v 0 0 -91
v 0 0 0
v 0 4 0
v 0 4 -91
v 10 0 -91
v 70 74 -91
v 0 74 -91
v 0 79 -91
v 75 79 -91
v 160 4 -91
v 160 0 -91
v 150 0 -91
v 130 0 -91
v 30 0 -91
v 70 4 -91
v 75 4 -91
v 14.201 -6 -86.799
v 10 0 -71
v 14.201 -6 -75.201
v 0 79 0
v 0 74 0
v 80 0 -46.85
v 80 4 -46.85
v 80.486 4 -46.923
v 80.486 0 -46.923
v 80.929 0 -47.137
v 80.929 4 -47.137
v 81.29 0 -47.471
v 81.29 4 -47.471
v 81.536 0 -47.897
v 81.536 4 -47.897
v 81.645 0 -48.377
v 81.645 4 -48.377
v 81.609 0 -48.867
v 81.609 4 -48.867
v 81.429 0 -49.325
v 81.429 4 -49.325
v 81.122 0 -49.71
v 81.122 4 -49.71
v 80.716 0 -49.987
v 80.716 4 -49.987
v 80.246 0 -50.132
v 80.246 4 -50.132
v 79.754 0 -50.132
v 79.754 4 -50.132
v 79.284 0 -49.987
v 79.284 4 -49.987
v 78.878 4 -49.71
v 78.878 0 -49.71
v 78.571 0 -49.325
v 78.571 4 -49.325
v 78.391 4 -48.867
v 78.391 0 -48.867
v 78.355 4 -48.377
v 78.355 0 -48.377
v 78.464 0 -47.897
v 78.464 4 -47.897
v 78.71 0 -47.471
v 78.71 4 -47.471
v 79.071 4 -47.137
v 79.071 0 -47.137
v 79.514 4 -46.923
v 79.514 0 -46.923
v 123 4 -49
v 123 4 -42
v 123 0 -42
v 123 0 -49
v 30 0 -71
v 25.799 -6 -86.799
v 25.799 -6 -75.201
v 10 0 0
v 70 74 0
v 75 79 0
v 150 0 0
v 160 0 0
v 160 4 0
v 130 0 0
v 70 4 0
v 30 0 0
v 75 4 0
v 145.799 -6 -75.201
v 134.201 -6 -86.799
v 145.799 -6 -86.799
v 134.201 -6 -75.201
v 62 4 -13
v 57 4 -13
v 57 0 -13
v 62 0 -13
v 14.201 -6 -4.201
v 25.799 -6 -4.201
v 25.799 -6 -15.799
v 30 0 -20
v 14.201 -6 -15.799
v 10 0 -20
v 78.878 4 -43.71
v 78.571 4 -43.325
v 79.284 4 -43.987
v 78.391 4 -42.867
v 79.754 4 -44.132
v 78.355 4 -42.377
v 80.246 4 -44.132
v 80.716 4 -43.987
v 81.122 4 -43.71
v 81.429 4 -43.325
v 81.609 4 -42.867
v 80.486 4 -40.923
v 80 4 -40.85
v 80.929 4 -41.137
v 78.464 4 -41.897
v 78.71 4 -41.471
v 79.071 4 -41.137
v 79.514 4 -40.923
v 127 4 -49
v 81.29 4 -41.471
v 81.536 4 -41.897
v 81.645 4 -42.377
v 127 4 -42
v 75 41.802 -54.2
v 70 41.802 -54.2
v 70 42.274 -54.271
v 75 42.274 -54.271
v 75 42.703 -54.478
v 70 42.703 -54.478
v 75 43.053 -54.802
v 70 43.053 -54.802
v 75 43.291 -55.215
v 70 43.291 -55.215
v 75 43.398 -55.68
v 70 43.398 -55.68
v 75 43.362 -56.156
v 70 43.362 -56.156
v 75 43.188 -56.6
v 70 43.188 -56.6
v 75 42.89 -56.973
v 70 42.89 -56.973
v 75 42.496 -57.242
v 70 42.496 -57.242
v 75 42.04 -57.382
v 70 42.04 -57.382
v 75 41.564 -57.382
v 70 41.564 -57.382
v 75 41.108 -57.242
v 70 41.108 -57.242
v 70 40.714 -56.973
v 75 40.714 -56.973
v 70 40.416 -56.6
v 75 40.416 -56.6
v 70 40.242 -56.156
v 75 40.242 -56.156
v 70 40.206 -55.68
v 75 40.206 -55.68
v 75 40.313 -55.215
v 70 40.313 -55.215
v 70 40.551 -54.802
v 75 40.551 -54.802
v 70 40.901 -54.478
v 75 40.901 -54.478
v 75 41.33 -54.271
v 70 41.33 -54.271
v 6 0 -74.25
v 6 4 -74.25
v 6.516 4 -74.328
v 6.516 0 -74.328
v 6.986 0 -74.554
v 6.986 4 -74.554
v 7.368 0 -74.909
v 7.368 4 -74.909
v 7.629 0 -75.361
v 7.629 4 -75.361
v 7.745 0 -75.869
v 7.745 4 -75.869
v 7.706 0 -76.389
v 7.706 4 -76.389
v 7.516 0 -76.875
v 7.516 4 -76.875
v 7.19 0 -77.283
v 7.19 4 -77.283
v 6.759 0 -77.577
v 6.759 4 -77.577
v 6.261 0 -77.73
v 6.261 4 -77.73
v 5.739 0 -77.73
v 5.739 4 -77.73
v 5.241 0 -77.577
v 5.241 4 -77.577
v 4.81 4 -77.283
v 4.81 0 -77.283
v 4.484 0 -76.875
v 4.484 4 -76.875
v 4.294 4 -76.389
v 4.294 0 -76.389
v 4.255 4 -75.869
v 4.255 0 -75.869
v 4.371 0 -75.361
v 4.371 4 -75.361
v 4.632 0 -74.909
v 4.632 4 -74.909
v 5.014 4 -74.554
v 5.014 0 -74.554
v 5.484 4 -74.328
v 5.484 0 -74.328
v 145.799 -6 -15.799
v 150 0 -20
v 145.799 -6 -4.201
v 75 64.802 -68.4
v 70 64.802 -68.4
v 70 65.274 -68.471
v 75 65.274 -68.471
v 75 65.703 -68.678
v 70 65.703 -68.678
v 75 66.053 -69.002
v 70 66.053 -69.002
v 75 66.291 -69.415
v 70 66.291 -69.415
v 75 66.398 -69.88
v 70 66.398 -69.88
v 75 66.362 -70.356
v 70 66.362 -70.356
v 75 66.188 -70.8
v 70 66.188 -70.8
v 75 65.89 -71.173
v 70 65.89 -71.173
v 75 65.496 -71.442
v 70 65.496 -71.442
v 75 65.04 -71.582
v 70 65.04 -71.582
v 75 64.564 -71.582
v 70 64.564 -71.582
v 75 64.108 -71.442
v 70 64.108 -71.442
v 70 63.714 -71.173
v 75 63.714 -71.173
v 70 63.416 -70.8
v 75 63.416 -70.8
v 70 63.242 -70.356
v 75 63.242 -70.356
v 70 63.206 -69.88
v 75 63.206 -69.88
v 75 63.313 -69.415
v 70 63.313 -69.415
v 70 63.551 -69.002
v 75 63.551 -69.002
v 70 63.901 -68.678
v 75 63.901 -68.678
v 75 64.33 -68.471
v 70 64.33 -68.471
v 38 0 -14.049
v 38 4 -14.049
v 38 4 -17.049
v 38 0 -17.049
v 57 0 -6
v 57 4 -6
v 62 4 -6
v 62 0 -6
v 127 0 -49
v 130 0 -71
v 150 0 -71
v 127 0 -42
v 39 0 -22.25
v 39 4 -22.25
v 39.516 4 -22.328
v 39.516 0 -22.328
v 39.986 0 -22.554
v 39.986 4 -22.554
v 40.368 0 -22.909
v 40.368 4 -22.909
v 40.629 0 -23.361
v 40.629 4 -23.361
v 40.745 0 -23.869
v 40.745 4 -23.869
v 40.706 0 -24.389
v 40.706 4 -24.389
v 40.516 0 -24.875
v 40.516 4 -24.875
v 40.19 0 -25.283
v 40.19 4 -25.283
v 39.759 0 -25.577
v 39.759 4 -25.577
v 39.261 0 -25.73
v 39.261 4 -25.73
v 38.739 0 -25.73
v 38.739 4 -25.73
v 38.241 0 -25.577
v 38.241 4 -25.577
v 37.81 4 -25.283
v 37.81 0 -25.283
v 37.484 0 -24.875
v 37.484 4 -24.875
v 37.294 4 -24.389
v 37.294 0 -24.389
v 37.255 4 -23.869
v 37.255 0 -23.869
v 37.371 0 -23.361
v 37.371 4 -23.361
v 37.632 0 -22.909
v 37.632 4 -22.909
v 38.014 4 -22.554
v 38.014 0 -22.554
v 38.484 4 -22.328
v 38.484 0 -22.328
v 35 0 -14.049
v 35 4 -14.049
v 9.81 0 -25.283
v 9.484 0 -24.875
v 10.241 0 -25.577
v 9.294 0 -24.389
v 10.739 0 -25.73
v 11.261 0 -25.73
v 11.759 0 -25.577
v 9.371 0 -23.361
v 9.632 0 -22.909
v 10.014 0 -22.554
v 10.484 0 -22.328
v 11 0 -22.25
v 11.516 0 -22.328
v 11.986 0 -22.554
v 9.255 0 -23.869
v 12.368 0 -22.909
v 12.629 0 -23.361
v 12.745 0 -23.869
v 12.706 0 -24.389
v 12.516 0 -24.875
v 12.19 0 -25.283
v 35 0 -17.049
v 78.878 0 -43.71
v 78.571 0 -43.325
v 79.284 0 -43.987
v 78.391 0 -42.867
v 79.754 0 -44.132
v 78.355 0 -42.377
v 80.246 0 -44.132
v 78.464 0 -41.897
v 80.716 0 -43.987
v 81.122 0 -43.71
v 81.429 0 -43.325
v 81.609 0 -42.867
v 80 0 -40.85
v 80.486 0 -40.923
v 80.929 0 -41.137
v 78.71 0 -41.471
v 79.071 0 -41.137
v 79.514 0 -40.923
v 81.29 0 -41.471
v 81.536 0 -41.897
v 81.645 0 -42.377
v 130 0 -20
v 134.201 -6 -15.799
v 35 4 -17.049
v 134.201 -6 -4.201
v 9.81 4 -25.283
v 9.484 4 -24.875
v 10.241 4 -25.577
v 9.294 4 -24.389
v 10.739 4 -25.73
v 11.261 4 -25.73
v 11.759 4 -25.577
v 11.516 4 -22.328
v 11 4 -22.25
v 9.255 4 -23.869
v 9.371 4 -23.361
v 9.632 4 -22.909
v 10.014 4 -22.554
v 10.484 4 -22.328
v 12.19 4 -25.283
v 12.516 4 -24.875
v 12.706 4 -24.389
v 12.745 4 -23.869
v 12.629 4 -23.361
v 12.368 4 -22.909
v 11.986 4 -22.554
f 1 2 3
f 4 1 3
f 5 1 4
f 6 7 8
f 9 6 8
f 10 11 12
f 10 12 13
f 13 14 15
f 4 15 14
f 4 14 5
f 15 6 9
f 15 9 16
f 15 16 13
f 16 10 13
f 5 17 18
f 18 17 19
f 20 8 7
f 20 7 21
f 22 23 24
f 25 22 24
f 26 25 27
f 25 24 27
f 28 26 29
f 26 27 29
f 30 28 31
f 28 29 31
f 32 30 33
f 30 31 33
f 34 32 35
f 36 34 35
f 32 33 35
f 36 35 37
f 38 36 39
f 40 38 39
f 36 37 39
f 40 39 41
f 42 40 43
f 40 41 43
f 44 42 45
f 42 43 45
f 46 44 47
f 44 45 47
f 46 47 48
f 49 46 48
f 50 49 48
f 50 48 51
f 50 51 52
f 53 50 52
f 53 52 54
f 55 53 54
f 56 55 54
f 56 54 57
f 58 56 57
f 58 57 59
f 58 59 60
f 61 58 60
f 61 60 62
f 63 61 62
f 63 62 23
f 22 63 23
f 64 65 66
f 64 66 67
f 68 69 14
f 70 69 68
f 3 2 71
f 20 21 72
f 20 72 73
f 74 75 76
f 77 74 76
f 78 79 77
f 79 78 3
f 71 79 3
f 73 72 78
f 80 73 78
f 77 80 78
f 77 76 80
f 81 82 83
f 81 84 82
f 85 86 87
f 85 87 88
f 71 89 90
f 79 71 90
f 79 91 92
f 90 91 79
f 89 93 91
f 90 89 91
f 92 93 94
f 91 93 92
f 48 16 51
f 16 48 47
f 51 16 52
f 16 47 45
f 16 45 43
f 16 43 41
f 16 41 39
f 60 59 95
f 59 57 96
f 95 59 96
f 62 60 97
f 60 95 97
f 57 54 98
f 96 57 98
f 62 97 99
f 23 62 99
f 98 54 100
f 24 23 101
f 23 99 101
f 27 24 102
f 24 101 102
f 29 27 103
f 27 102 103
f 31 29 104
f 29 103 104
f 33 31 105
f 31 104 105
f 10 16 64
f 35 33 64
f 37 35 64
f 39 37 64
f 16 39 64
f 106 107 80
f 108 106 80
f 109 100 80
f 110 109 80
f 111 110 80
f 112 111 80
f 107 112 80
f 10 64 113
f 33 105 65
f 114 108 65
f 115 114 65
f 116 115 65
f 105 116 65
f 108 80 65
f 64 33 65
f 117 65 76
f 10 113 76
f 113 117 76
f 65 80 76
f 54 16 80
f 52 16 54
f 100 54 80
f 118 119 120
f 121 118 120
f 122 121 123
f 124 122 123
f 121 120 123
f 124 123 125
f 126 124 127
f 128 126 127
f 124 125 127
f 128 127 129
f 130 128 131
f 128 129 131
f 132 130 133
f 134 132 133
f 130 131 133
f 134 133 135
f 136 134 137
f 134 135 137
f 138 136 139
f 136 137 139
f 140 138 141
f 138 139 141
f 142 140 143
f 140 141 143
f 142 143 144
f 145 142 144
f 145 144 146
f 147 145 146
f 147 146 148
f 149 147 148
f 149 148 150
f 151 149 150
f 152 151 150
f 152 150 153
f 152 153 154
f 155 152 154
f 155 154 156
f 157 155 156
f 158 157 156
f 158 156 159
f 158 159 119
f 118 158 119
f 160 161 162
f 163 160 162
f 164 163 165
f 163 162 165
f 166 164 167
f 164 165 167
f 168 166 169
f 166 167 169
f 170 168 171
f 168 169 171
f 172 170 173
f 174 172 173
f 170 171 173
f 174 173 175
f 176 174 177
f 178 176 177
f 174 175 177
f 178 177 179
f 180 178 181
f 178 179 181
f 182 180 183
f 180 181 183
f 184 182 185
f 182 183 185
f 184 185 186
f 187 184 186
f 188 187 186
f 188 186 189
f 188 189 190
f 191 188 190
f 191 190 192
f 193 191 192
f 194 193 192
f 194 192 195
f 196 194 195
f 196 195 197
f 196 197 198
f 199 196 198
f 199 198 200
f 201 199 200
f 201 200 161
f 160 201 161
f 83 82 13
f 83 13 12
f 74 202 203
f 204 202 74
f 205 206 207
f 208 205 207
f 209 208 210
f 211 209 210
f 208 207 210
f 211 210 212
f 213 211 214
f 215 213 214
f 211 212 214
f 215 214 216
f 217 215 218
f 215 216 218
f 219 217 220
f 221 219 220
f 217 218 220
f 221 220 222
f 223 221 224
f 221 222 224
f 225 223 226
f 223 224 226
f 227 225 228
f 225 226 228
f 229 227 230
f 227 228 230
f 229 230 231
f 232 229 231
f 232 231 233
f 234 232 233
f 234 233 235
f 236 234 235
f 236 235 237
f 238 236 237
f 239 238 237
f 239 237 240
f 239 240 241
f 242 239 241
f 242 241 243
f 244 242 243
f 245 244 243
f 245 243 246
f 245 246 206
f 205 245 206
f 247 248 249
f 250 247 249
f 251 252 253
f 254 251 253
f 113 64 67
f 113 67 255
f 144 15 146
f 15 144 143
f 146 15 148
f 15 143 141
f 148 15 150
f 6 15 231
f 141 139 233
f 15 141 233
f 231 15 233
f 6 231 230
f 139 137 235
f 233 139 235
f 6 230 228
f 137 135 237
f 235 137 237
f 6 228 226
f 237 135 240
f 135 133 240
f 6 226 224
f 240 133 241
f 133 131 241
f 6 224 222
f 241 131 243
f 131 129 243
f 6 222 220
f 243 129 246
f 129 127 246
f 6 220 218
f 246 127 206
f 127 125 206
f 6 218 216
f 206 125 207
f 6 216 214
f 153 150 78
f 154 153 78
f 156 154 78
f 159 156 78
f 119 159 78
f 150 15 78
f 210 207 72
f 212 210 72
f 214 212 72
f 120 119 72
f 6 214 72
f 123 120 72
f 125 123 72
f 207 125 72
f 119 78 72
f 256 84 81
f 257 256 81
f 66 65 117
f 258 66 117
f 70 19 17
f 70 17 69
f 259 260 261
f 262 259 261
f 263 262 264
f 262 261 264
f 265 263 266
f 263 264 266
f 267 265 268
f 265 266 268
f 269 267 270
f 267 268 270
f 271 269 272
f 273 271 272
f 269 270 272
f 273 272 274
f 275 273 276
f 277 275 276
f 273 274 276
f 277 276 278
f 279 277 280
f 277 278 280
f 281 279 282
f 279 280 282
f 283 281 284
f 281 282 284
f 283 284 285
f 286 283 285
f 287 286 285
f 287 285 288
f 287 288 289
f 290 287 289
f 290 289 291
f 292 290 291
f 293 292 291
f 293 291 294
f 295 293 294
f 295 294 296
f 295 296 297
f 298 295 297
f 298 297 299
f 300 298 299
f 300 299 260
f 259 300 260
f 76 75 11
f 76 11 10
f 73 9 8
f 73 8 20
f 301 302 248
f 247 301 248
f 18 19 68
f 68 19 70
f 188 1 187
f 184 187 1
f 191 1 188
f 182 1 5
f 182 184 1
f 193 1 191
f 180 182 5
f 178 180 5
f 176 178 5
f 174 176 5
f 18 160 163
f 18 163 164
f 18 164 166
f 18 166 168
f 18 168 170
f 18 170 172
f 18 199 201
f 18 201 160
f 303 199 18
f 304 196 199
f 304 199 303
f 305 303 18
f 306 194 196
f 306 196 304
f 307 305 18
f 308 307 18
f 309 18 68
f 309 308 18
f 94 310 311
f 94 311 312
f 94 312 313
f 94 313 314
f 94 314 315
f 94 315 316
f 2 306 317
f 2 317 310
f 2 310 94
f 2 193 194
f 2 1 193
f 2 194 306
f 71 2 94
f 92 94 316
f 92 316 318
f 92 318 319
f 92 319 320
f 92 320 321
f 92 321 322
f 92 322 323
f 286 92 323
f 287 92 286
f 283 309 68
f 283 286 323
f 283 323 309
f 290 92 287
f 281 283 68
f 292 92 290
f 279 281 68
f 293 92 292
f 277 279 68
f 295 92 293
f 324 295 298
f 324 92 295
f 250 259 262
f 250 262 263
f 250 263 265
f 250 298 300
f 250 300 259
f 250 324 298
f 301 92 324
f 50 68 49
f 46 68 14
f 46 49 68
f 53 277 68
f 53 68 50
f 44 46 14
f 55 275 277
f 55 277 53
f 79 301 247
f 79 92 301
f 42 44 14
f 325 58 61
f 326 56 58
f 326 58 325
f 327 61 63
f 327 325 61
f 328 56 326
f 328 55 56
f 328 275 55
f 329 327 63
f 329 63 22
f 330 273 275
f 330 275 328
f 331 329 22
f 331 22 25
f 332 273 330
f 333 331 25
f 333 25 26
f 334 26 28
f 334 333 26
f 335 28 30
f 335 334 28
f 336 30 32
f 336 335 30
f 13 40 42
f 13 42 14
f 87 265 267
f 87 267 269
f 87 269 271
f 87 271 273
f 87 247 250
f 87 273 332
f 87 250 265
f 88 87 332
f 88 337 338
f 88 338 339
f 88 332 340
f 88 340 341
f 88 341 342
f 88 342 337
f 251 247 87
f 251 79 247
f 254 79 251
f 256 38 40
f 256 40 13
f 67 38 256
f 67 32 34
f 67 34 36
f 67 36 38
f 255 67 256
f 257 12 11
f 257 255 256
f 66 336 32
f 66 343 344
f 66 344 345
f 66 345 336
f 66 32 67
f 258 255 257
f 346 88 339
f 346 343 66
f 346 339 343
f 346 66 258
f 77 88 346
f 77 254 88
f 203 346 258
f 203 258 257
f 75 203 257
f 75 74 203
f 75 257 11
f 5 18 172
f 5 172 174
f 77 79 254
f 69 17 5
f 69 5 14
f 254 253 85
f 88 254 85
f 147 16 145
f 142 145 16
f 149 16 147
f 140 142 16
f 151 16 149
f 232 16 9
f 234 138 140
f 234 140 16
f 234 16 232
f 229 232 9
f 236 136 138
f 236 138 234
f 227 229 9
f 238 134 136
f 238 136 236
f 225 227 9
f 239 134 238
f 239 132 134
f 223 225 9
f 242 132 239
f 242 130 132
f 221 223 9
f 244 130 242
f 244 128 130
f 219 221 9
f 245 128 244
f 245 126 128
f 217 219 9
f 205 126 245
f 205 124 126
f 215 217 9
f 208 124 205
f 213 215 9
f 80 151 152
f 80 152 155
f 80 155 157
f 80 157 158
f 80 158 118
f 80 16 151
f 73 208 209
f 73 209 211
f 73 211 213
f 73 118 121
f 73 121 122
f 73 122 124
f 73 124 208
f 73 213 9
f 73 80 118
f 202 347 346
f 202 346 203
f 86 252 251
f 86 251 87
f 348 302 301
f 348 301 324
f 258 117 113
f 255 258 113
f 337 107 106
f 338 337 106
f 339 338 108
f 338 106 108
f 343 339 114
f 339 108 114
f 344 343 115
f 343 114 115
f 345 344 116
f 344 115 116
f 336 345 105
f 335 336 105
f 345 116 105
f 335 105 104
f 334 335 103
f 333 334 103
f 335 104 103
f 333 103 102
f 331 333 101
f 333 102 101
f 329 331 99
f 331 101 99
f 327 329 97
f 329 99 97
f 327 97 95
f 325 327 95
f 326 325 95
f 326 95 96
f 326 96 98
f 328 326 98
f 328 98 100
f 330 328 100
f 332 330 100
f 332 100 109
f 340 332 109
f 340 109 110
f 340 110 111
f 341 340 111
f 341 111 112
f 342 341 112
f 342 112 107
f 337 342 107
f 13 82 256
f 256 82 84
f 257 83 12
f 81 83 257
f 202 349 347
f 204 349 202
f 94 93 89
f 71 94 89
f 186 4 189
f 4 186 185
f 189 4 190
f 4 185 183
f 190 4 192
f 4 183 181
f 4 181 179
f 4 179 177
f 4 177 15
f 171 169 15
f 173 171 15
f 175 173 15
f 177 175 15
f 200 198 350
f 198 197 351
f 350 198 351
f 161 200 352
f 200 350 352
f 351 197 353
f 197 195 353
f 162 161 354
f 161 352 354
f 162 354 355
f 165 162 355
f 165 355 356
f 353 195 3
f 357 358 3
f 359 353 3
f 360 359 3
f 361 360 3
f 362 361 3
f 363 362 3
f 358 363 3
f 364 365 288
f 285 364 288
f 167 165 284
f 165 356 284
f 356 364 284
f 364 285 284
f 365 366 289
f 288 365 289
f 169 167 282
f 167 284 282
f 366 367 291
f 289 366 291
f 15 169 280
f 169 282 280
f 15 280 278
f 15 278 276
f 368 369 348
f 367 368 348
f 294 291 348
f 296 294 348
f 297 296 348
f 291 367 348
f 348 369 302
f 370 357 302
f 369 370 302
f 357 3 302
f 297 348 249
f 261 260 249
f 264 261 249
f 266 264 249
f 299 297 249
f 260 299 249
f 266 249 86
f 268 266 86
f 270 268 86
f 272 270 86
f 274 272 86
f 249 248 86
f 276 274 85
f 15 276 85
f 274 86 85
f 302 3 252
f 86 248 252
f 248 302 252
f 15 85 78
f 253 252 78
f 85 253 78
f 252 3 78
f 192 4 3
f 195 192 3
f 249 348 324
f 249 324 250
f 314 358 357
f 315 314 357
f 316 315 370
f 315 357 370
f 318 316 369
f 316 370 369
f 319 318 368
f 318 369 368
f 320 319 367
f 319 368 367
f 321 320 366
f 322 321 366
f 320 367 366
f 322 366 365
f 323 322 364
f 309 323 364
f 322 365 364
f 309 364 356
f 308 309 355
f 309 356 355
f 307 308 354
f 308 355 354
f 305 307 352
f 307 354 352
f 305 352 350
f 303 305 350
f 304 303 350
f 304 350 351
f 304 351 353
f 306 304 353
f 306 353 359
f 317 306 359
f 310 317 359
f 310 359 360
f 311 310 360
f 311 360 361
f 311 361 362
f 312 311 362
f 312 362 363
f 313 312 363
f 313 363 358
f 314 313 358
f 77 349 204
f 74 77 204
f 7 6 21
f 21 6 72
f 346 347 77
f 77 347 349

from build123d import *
from OCP.BRepFilletAPI import BRepFilletAPI_MakeChamfer

# Parameters (mm, degrees)
SKETCH1_W           = 160
SKETCH1_H           = 4
BOSS_EXTRUDE1_DEPTH = 91
SKETCH2_W           = 5
SKETCH2_H           = 75
BOSS_EXTRUDE2_DEPTH = 91
SKETCH3_W           = 91
SKETCH3_H           = 5
BOSS_EXTRUDE3_DEPTH = 70
SKETCH4_W           = 5
SKETCH4_H           = 7
CUT_EXTRUDE1_DEPTH  = 91
SKETCH5_R           = 1.75
CUT_EXTRUDE2_DEPTH  = 91
SKETCH6_W           = 3
SKETCH6_H           = 3
CUT_EXTRUDE3_DEPTH  = 91
SKETCH7_R           = 1.65
CUT_EXTRUDE4_DEPTH  = 91
SKETCH8_W           = 20
SKETCH8_H           = 20
BOSS_EXTRUDE4_DEPTH = 6
CHAMFER1_SIZE       = 6
CHAMFER1_SIZE_2     = 4.201245229
SKETCH9_W           = 20
SKETCH9_H           = 20
BOSS_EXTRUDE5_DEPTH = 6
CHAMFER2_SIZE       = 6
CHAMFER2_SIZE_2     = 4.201245229
SKETCH10_W          = 4
SKETCH10_H          = 7
CUT_EXTRUDE5_DEPTH  = 6
SKETCH11_R          = 1.6
CUT_EXTRUDE6_DEPTH  = 6


with BuildPart() as part:
    # Sketch1 → Boss-Extrude1 (new body)
    with BuildSketch(Plane.XY):
        with Locations((80, 2)):
            Rectangle(SKETCH1_W, SKETCH1_H)
    extrude(amount=-BOSS_EXTRUDE1_DEPTH)

    # Sketch2 → Boss-Extrude2 (add)
    with BuildSketch(Plane.XY):
        with Locations((72.5, 41.5)):
            Rectangle(SKETCH2_W, SKETCH2_H)
    extrude(amount=-BOSS_EXTRUDE2_DEPTH)

    # Sketch3 → Boss-Extrude3 (add)
    with BuildSketch(Plane.ZY.offset(-70)):
        with Locations((-45.5, 76.5)):
            Rectangle(SKETCH3_W, SKETCH3_H)
    extrude(amount=BOSS_EXTRUDE3_DEPTH)

    # Sketch4 → Cut-Extrude1 (cut)
    with BuildSketch(Plane(origin=(0, 4, 0), x_dir=(1, 0, 0), z_dir=(0, 1, 0))):
        with Locations((59.5, 9.5)):
            Rectangle(SKETCH4_W, SKETCH4_H)
    extrude(amount=-CUT_EXTRUDE1_DEPTH, mode=Mode.SUBTRACT)

    # Sketch5 → Cut-Extrude2 (cut)
    with BuildSketch(Plane(origin=(0, 4, 0), x_dir=(1, 0, 0), z_dir=(0, 1, 0))):
        with Locations(Location((11, 24, 0), (0, 0, 270))):
            Circle(SKETCH5_R)
        with Locations(Location((39, 24, 0), (0, 0, 270))):
            Circle(SKETCH5_R)
        with Locations(Location((6, 76, 0), (0, 0, 270))):
            Circle(SKETCH5_R)
    extrude(amount=-CUT_EXTRUDE2_DEPTH, mode=Mode.SUBTRACT)

    # Sketch6 → Cut-Extrude3 (cut)
    with BuildSketch(Plane(origin=(0, 4, 0), x_dir=(1, 0, 0), z_dir=(0, 1, 0))):
        with Locations((36.5, 15.548738613)):
            Rectangle(SKETCH6_W, SKETCH6_H)
    extrude(amount=-CUT_EXTRUDE3_DEPTH, mode=Mode.SUBTRACT)

    # Sketch7 → Cut-Extrude4 (cut)
    with BuildSketch(Plane(origin=(0, 4, 0), x_dir=(1, 0, 0), z_dir=(0, 1, 0))):
        with Locations(Location((80, 48.5, 0), (0, 0, 270))):
            Circle(SKETCH7_R)
        with Locations(Location((80, 42.5, 0), (0, 0, 270))):
            Circle(SKETCH7_R)
    extrude(amount=-CUT_EXTRUDE4_DEPTH, mode=Mode.SUBTRACT)

    # Sketch8 → Boss-Extrude4 (add)
    with BuildSketch(Plane.XZ):
        with Locations((20, -10)):
            Rectangle(SKETCH8_W, SKETCH8_H)
    extrude(amount=BOSS_EXTRUDE4_DEPTH)

    # Chamfer1
    chamfer1_edges_1 = [part.edges().sort_by_distance(p)[0] for p in [
        (30, -6, -10),
    ]]
    chamfer1_side_1 = [part.faces().sort_by_distance(p)[0] for p in [
        (30, -5.915975095, -10),
    ]]
    chamfer1_edges_2 = [part.edges().sort_by_distance(p)[0] for p in [
        (20, -6, -20),
    ]]
    chamfer1_side_2 = [part.faces().sort_by_distance(p)[0] for p in [
        (20, -5.915975095, -20),
    ]]
    chamfer1_edges_3 = [part.edges().sort_by_distance(p)[0] for p in [
        (10, -6, -10),
    ]]
    chamfer1_side_3 = [part.faces().sort_by_distance(p)[0] for p in [
        (10, -5.915975095, -10),
    ]]
    chamfer1_edges_4 = [part.edges().sort_by_distance(p)[0] for p in [
        (20, -6, 0),
    ]]
    chamfer1_side_4 = [part.faces().sort_by_distance(p)[0] for p in [
        (20, -5.915975095, 0),
    ]]
    chamfer1 = BRepFilletAPI_MakeChamfer(part.part.solid().wrapped)
    for e in chamfer1_edges_1:
        chamfer1.Add(CHAMFER1_SIZE - 0.0001, CHAMFER1_SIZE_2 - 0.0001, e.wrapped, chamfer1_side_1[0].wrapped)
    for e in chamfer1_edges_2:
        chamfer1.Add(CHAMFER1_SIZE - 0.0001, CHAMFER1_SIZE_2 - 0.0001, e.wrapped, chamfer1_side_2[0].wrapped)
    for e in chamfer1_edges_3:
        chamfer1.Add(CHAMFER1_SIZE - 0.0001, CHAMFER1_SIZE_2 - 0.0001, e.wrapped, chamfer1_side_3[0].wrapped)
    for e in chamfer1_edges_4:
        chamfer1.Add(CHAMFER1_SIZE - 0.0001, CHAMFER1_SIZE_2 - 0.0001, e.wrapped, chamfer1_side_4[0].wrapped)
    add(Compound.cast(chamfer1.Shape()), mode=Mode.REPLACE)  # a hair under: the kernel refuses the full size

    # Sketch9 → Boss-Extrude5 (add)
    with BuildSketch(Plane.XZ):
        with Locations((20, -81)):
            Rectangle(SKETCH9_W, SKETCH9_H)
        with Locations((140, -81)):
            Rectangle(SKETCH9_W, SKETCH9_H)
        with Locations((140, -10)):
            Rectangle(SKETCH9_W, SKETCH9_H)
    extrude(amount=BOSS_EXTRUDE5_DEPTH)

    # Chamfer2
    chamfer2_edges_1 = [part.edges().sort_by_distance(p)[0] for p in [
        (30, -6, -81),
    ]]
    chamfer2_side_1 = [part.faces().sort_by_distance(p)[0] for p in [
        (30, -5.915975095, -81),
    ]]
    chamfer2_edges_2 = [part.edges().sort_by_distance(p)[0] for p in [
        (20, -6, -91),
    ]]
    chamfer2_side_2 = [part.faces().sort_by_distance(p)[0] for p in [
        (20, -5.915975095, -91),
    ]]
    chamfer2_edges_3 = [part.edges().sort_by_distance(p)[0] for p in [
        (140, -6, -91),
    ]]
    chamfer2_side_3 = [part.faces().sort_by_distance(p)[0] for p in [
        (140, -5.915975095, -91),
    ]]
    chamfer2_edges_4 = [part.edges().sort_by_distance(p)[0] for p in [
        (10, -6, -81),
    ]]
    chamfer2_side_4 = [part.faces().sort_by_distance(p)[0] for p in [
        (10, -5.915975095, -81),
    ]]
    chamfer2_edges_5 = [part.edges().sort_by_distance(p)[0] for p in [
        (20, -6, -71),
    ]]
    chamfer2_side_5 = [part.faces().sort_by_distance(p)[0] for p in [
        (20, -5.915975095, -71),
    ]]
    chamfer2_edges_6 = [part.edges().sort_by_distance(p)[0] for p in [
        (150, -6, -81),
    ]]
    chamfer2_side_6 = [part.faces().sort_by_distance(p)[0] for p in [
        (150, -5.915975095, -81),
    ]]
    chamfer2_edges_7 = [part.edges().sort_by_distance(p)[0] for p in [
        (130, -6, -81),
    ]]
    chamfer2_side_7 = [part.faces().sort_by_distance(p)[0] for p in [
        (130, -5.915975095, -81),
    ]]
    chamfer2_edges_8 = [part.edges().sort_by_distance(p)[0] for p in [
        (140, -6, -71),
    ]]
    chamfer2_side_8 = [part.faces().sort_by_distance(p)[0] for p in [
        (140, -5.915975095, -71),
    ]]
    chamfer2_edges_9 = [part.edges().sort_by_distance(p)[0] for p in [
        (130, -6, -10),
    ]]
    chamfer2_side_9 = [part.faces().sort_by_distance(p)[0] for p in [
        (130, -5.915975095, -10),
    ]]
    chamfer2_edges_10 = [part.edges().sort_by_distance(p)[0] for p in [
        (140, -6, -20),
    ]]
    chamfer2_side_10 = [part.faces().sort_by_distance(p)[0] for p in [
        (140, -5.915975095, -20),
    ]]
    chamfer2_edges_11 = [part.edges().sort_by_distance(p)[0] for p in [
        (150, -6, -10),
    ]]
    chamfer2_side_11 = [part.faces().sort_by_distance(p)[0] for p in [
        (150, -5.915975095, -10),
    ]]
    chamfer2_edges_12 = [part.edges().sort_by_distance(p)[0] for p in [
        (140, -6, 0),
    ]]
    chamfer2_side_12 = [part.faces().sort_by_distance(p)[0] for p in [
        (140, -5.915975095, 0),
    ]]
    chamfer2 = BRepFilletAPI_MakeChamfer(part.part.solid().wrapped)
    for e in chamfer2_edges_1:
        chamfer2.Add(CHAMFER2_SIZE - 0.0001, CHAMFER2_SIZE_2 - 0.0001, e.wrapped, chamfer2_side_1[0].wrapped)
    for e in chamfer2_edges_2:
        chamfer2.Add(CHAMFER2_SIZE - 0.0001, CHAMFER2_SIZE_2 - 0.0001, e.wrapped, chamfer2_side_2[0].wrapped)
    for e in chamfer2_edges_3:
        chamfer2.Add(CHAMFER2_SIZE - 0.0001, CHAMFER2_SIZE_2 - 0.0001, e.wrapped, chamfer2_side_3[0].wrapped)
    for e in chamfer2_edges_4:
        chamfer2.Add(CHAMFER2_SIZE - 0.0001, CHAMFER2_SIZE_2 - 0.0001, e.wrapped, chamfer2_side_4[0].wrapped)
    for e in chamfer2_edges_5:
        chamfer2.Add(CHAMFER2_SIZE - 0.0001, CHAMFER2_SIZE_2 - 0.0001, e.wrapped, chamfer2_side_5[0].wrapped)
    for e in chamfer2_edges_6:
        chamfer2.Add(CHAMFER2_SIZE - 0.0001, CHAMFER2_SIZE_2 - 0.0001, e.wrapped, chamfer2_side_6[0].wrapped)
    for e in chamfer2_edges_7:
        chamfer2.Add(CHAMFER2_SIZE - 0.0001, CHAMFER2_SIZE_2 - 0.0001, e.wrapped, chamfer2_side_7[0].wrapped)
    for e in chamfer2_edges_8:
        chamfer2.Add(CHAMFER2_SIZE - 0.0001, CHAMFER2_SIZE_2 - 0.0001, e.wrapped, chamfer2_side_8[0].wrapped)
    for e in chamfer2_edges_9:
        chamfer2.Add(CHAMFER2_SIZE - 0.0001, CHAMFER2_SIZE_2 - 0.0001, e.wrapped, chamfer2_side_9[0].wrapped)
    for e in chamfer2_edges_10:
        chamfer2.Add(CHAMFER2_SIZE - 0.0001, CHAMFER2_SIZE_2 - 0.0001, e.wrapped, chamfer2_side_10[0].wrapped)
    for e in chamfer2_edges_11:
        chamfer2.Add(CHAMFER2_SIZE - 0.0001, CHAMFER2_SIZE_2 - 0.0001, e.wrapped, chamfer2_side_11[0].wrapped)
    for e in chamfer2_edges_12:
        chamfer2.Add(CHAMFER2_SIZE - 0.0001, CHAMFER2_SIZE_2 - 0.0001, e.wrapped, chamfer2_side_12[0].wrapped)
    add(Compound.cast(chamfer2.Shape()), mode=Mode.REPLACE)  # a hair under: the kernel refuses the full size

    # Sketch10 → Cut-Extrude5 (cut)
    with BuildSketch(Plane(origin=(0, 4, 0), x_dir=(1, 0, 0), z_dir=(0, 1, 0))):
        with Locations((125, 45.5)):
            Rectangle(SKETCH10_W, SKETCH10_H)
    extrude(amount=-CUT_EXTRUDE5_DEPTH, mode=Mode.SUBTRACT)

    # Sketch11 → Cut-Extrude6 (cut)
    with BuildSketch(Plane.ZY.offset(-70)):
        with Locations((-70, 64.80201774)):
            Circle(SKETCH11_R)
        with Locations((-55.8, 41.80201774)):
            Circle(SKETCH11_R)
    extrude(amount=-CUT_EXTRUDE6_DEPTH, mode=Mode.SUBTRACT)


solid = part.part
